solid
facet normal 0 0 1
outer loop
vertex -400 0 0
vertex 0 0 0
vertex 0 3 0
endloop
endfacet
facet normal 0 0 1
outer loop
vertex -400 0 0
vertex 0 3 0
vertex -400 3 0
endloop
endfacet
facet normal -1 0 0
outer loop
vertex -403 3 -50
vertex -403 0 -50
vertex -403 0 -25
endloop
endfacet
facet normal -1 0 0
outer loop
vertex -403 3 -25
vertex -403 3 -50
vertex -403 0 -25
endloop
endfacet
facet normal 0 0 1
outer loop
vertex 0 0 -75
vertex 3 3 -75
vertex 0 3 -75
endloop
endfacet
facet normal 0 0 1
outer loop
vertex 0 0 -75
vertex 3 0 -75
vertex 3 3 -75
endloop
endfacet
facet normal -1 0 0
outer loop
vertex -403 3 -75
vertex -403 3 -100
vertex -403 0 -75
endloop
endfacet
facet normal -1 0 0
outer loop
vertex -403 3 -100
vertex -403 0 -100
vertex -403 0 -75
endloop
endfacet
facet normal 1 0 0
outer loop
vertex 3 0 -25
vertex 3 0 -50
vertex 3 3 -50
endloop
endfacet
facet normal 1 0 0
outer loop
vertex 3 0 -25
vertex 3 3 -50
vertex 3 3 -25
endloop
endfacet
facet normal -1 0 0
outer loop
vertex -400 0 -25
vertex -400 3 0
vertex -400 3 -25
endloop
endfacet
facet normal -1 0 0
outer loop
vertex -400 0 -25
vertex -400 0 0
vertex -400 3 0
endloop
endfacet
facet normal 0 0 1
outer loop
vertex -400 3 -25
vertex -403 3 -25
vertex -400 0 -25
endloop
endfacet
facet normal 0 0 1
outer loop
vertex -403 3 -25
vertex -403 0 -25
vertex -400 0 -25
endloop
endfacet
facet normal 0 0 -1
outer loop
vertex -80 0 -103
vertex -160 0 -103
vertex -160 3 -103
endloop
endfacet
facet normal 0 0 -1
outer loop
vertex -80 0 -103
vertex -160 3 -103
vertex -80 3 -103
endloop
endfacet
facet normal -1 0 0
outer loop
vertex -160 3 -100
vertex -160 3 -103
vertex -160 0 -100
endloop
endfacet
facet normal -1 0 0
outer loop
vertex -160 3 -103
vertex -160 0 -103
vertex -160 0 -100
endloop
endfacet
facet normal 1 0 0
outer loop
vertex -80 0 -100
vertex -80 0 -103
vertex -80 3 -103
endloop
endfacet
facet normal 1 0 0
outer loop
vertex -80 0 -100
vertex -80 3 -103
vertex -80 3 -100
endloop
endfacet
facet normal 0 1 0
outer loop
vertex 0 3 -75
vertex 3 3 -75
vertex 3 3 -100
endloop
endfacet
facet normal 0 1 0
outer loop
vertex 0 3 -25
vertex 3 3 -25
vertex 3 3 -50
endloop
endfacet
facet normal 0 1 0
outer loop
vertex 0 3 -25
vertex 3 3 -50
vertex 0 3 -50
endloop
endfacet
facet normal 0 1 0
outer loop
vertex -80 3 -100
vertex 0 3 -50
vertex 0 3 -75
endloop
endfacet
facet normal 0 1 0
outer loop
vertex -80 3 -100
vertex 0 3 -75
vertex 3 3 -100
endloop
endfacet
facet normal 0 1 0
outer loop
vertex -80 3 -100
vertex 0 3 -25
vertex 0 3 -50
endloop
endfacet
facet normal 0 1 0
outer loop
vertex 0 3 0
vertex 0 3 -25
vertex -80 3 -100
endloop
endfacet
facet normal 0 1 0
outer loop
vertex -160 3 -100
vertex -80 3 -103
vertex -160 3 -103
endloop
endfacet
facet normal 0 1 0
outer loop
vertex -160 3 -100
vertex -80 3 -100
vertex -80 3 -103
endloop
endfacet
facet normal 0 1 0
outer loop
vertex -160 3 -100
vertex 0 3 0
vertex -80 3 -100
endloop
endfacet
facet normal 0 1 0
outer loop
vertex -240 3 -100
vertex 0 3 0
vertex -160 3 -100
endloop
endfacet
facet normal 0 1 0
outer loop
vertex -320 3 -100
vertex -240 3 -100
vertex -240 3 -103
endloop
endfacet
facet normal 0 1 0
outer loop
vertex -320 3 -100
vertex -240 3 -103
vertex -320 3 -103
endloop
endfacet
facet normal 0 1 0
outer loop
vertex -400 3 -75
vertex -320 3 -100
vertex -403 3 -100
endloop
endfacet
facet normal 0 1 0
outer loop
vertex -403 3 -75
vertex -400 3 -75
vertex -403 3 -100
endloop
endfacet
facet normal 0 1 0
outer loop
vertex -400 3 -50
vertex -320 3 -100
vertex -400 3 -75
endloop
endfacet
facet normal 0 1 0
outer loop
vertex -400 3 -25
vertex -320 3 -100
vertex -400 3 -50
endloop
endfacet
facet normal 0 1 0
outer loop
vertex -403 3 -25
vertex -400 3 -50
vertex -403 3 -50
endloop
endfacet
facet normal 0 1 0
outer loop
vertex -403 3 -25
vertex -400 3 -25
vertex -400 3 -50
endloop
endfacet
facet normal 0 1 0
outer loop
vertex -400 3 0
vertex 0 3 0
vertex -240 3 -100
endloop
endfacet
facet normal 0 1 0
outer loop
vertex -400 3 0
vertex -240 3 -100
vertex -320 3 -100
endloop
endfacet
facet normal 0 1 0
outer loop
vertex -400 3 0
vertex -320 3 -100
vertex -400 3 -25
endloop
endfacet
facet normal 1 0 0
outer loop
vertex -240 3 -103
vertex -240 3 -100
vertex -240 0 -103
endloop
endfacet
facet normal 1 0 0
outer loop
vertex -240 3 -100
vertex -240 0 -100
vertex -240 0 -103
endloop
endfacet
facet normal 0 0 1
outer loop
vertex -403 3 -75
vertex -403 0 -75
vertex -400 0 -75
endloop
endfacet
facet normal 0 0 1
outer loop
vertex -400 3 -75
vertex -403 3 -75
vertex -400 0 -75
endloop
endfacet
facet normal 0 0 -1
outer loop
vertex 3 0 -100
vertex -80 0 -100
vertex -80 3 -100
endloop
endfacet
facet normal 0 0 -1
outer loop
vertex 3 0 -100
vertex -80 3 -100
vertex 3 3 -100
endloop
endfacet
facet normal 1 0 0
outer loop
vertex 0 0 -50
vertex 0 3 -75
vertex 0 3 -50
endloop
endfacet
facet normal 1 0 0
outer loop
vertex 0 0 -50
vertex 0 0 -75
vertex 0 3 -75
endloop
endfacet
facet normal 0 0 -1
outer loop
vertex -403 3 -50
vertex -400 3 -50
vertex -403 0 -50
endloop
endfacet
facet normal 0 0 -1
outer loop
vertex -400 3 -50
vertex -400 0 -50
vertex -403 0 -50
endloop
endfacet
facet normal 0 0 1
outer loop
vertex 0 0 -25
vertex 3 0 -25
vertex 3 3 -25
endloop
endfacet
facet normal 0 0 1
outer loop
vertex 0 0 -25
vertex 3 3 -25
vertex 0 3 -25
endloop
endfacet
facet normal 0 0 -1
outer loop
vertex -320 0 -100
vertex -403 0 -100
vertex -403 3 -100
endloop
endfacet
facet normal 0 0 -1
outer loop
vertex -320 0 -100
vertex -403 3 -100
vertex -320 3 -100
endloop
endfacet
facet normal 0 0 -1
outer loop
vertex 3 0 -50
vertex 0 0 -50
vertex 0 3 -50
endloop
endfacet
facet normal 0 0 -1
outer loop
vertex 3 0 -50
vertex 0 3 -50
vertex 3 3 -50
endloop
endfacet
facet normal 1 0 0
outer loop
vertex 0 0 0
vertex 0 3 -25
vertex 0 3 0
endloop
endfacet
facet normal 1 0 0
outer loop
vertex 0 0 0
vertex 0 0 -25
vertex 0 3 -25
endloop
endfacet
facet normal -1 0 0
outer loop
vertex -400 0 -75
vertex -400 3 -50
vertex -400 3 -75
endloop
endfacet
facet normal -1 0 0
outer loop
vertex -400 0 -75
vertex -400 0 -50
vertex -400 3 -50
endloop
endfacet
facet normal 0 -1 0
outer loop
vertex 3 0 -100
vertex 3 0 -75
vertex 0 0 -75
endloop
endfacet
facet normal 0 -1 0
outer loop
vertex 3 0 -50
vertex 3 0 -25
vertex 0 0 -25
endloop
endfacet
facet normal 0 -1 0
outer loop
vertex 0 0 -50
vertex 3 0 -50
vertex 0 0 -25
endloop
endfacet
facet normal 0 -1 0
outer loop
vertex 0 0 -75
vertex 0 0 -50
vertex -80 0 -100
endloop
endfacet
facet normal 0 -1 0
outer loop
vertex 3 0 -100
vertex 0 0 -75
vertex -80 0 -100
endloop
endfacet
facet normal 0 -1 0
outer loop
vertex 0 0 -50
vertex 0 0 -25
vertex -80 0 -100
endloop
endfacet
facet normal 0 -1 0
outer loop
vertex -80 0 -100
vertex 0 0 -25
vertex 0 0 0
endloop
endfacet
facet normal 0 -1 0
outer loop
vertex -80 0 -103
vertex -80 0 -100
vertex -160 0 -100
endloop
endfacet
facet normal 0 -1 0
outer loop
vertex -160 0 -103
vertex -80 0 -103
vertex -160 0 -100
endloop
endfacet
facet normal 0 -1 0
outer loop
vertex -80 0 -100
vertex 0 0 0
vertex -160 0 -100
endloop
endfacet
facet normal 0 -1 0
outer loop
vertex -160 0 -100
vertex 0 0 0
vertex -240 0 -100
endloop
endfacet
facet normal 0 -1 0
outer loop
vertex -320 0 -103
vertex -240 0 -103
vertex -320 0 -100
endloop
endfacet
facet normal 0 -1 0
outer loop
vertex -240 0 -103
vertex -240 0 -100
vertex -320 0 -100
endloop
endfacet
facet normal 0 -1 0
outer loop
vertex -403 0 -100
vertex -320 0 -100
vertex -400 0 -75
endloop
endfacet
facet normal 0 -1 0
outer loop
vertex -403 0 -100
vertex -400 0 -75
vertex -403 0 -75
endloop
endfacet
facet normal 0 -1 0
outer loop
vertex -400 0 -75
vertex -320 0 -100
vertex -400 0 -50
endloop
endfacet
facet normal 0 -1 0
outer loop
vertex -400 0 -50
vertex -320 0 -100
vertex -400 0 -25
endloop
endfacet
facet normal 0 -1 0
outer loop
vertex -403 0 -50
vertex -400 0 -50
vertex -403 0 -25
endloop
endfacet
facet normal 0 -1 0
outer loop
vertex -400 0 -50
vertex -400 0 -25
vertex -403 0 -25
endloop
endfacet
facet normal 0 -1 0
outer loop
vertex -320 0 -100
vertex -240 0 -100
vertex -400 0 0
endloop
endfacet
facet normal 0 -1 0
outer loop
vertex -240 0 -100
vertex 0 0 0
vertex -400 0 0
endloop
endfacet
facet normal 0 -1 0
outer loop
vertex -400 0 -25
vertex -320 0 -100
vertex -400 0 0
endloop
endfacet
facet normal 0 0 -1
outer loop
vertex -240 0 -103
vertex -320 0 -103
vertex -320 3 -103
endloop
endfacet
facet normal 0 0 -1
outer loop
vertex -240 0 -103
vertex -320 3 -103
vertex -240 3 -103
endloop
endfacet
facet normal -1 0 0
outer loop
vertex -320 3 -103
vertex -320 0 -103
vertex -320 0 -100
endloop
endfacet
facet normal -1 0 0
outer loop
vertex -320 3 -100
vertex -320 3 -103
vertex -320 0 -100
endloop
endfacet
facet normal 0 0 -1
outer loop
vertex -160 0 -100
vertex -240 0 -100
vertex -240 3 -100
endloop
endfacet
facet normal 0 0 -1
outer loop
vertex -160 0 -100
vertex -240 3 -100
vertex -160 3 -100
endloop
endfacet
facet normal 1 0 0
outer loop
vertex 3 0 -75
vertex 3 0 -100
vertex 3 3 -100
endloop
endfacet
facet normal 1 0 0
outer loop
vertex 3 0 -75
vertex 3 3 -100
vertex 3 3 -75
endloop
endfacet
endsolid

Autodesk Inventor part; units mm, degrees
ref_plane "YZ Plane" through (0, 0, 0) normal (1, 0, 0) x (0, 1, 0)
ref_plane "XZ Plane" through (0, 0, 0) normal (0, 1, 0) x (-1, 0, 0)
ref_plane "XY Plane" through (0, 0, 0) normal (0, 0, 1) x (1, 0, 0)
sketch "Sketch1" plane through (0, 0, 0) normal (0, 1, 0) x (-1, 0, 0)
  line L0 (0, 0) -> (400, 0)
  line L1 (400, 0) -> (400, -100)
  line L2 (400, -100) -> (0, -100)
  line L3 (0, -100) -> (0, 0)
  line L4 (320, -103) -> (320, -100)
  line L5 (80, -103) -> (80, -100)
  line L6 (240, -100) -> (240, -103)
  line L7 (160, -103) -> (160, -100)
  line L8 (400, -25) -> (400, -50)
  line L9 (400, -50) -> (403, -50)
  line L10 (200, 0) -> (200, -100) construction
  line L11 (0, 0) -> (0, -100)
  line L12 (-3, -25) -> (0, -25)
  line L13 (0, -25) -> (0, -50)
  line L14 (0, -50) -> (-3, -50)
  line L15 (-3, -75) -> (0, -75)
  line L16 (320, -103) -> (240, -103)
  line L17 (160, -103) -> (80, -103)
  line L18 (0, -100) -> (-3, -100)
  line L19 (-3, -100) -> (-3, -75)
  line L20 (-3, -50) -> (-3, -25)
  line L21 (400, 0) -> (0, 0)
  line L22 (400, -100) -> (400, 0)
  line L23 (403, -75) -> (400, -75)
  line L24 (400, -50) -> (403, -50)
  line L25 (400, -25) -> (400, -50)
  line L26 (403, -25) -> (400, -25)
  line L27 (400, 0) -> (400, -100)
  line L28 (403, -100) -> (403, -75)
  line L29 (403, -50) -> (403, -25)
  line L30 (403, -100) -> (400, -100)
  dimension "d0" = 400
  dimension "d1" = 100
  dimension "d7" = 3
  dimension "d8" = 80
  dimension "d11" = 25
  dimension "d12" = 3
extrude "Extrusion1" add sketch "Sketch1" along normal blind 3
properties part number "Lateral sup e inf"
